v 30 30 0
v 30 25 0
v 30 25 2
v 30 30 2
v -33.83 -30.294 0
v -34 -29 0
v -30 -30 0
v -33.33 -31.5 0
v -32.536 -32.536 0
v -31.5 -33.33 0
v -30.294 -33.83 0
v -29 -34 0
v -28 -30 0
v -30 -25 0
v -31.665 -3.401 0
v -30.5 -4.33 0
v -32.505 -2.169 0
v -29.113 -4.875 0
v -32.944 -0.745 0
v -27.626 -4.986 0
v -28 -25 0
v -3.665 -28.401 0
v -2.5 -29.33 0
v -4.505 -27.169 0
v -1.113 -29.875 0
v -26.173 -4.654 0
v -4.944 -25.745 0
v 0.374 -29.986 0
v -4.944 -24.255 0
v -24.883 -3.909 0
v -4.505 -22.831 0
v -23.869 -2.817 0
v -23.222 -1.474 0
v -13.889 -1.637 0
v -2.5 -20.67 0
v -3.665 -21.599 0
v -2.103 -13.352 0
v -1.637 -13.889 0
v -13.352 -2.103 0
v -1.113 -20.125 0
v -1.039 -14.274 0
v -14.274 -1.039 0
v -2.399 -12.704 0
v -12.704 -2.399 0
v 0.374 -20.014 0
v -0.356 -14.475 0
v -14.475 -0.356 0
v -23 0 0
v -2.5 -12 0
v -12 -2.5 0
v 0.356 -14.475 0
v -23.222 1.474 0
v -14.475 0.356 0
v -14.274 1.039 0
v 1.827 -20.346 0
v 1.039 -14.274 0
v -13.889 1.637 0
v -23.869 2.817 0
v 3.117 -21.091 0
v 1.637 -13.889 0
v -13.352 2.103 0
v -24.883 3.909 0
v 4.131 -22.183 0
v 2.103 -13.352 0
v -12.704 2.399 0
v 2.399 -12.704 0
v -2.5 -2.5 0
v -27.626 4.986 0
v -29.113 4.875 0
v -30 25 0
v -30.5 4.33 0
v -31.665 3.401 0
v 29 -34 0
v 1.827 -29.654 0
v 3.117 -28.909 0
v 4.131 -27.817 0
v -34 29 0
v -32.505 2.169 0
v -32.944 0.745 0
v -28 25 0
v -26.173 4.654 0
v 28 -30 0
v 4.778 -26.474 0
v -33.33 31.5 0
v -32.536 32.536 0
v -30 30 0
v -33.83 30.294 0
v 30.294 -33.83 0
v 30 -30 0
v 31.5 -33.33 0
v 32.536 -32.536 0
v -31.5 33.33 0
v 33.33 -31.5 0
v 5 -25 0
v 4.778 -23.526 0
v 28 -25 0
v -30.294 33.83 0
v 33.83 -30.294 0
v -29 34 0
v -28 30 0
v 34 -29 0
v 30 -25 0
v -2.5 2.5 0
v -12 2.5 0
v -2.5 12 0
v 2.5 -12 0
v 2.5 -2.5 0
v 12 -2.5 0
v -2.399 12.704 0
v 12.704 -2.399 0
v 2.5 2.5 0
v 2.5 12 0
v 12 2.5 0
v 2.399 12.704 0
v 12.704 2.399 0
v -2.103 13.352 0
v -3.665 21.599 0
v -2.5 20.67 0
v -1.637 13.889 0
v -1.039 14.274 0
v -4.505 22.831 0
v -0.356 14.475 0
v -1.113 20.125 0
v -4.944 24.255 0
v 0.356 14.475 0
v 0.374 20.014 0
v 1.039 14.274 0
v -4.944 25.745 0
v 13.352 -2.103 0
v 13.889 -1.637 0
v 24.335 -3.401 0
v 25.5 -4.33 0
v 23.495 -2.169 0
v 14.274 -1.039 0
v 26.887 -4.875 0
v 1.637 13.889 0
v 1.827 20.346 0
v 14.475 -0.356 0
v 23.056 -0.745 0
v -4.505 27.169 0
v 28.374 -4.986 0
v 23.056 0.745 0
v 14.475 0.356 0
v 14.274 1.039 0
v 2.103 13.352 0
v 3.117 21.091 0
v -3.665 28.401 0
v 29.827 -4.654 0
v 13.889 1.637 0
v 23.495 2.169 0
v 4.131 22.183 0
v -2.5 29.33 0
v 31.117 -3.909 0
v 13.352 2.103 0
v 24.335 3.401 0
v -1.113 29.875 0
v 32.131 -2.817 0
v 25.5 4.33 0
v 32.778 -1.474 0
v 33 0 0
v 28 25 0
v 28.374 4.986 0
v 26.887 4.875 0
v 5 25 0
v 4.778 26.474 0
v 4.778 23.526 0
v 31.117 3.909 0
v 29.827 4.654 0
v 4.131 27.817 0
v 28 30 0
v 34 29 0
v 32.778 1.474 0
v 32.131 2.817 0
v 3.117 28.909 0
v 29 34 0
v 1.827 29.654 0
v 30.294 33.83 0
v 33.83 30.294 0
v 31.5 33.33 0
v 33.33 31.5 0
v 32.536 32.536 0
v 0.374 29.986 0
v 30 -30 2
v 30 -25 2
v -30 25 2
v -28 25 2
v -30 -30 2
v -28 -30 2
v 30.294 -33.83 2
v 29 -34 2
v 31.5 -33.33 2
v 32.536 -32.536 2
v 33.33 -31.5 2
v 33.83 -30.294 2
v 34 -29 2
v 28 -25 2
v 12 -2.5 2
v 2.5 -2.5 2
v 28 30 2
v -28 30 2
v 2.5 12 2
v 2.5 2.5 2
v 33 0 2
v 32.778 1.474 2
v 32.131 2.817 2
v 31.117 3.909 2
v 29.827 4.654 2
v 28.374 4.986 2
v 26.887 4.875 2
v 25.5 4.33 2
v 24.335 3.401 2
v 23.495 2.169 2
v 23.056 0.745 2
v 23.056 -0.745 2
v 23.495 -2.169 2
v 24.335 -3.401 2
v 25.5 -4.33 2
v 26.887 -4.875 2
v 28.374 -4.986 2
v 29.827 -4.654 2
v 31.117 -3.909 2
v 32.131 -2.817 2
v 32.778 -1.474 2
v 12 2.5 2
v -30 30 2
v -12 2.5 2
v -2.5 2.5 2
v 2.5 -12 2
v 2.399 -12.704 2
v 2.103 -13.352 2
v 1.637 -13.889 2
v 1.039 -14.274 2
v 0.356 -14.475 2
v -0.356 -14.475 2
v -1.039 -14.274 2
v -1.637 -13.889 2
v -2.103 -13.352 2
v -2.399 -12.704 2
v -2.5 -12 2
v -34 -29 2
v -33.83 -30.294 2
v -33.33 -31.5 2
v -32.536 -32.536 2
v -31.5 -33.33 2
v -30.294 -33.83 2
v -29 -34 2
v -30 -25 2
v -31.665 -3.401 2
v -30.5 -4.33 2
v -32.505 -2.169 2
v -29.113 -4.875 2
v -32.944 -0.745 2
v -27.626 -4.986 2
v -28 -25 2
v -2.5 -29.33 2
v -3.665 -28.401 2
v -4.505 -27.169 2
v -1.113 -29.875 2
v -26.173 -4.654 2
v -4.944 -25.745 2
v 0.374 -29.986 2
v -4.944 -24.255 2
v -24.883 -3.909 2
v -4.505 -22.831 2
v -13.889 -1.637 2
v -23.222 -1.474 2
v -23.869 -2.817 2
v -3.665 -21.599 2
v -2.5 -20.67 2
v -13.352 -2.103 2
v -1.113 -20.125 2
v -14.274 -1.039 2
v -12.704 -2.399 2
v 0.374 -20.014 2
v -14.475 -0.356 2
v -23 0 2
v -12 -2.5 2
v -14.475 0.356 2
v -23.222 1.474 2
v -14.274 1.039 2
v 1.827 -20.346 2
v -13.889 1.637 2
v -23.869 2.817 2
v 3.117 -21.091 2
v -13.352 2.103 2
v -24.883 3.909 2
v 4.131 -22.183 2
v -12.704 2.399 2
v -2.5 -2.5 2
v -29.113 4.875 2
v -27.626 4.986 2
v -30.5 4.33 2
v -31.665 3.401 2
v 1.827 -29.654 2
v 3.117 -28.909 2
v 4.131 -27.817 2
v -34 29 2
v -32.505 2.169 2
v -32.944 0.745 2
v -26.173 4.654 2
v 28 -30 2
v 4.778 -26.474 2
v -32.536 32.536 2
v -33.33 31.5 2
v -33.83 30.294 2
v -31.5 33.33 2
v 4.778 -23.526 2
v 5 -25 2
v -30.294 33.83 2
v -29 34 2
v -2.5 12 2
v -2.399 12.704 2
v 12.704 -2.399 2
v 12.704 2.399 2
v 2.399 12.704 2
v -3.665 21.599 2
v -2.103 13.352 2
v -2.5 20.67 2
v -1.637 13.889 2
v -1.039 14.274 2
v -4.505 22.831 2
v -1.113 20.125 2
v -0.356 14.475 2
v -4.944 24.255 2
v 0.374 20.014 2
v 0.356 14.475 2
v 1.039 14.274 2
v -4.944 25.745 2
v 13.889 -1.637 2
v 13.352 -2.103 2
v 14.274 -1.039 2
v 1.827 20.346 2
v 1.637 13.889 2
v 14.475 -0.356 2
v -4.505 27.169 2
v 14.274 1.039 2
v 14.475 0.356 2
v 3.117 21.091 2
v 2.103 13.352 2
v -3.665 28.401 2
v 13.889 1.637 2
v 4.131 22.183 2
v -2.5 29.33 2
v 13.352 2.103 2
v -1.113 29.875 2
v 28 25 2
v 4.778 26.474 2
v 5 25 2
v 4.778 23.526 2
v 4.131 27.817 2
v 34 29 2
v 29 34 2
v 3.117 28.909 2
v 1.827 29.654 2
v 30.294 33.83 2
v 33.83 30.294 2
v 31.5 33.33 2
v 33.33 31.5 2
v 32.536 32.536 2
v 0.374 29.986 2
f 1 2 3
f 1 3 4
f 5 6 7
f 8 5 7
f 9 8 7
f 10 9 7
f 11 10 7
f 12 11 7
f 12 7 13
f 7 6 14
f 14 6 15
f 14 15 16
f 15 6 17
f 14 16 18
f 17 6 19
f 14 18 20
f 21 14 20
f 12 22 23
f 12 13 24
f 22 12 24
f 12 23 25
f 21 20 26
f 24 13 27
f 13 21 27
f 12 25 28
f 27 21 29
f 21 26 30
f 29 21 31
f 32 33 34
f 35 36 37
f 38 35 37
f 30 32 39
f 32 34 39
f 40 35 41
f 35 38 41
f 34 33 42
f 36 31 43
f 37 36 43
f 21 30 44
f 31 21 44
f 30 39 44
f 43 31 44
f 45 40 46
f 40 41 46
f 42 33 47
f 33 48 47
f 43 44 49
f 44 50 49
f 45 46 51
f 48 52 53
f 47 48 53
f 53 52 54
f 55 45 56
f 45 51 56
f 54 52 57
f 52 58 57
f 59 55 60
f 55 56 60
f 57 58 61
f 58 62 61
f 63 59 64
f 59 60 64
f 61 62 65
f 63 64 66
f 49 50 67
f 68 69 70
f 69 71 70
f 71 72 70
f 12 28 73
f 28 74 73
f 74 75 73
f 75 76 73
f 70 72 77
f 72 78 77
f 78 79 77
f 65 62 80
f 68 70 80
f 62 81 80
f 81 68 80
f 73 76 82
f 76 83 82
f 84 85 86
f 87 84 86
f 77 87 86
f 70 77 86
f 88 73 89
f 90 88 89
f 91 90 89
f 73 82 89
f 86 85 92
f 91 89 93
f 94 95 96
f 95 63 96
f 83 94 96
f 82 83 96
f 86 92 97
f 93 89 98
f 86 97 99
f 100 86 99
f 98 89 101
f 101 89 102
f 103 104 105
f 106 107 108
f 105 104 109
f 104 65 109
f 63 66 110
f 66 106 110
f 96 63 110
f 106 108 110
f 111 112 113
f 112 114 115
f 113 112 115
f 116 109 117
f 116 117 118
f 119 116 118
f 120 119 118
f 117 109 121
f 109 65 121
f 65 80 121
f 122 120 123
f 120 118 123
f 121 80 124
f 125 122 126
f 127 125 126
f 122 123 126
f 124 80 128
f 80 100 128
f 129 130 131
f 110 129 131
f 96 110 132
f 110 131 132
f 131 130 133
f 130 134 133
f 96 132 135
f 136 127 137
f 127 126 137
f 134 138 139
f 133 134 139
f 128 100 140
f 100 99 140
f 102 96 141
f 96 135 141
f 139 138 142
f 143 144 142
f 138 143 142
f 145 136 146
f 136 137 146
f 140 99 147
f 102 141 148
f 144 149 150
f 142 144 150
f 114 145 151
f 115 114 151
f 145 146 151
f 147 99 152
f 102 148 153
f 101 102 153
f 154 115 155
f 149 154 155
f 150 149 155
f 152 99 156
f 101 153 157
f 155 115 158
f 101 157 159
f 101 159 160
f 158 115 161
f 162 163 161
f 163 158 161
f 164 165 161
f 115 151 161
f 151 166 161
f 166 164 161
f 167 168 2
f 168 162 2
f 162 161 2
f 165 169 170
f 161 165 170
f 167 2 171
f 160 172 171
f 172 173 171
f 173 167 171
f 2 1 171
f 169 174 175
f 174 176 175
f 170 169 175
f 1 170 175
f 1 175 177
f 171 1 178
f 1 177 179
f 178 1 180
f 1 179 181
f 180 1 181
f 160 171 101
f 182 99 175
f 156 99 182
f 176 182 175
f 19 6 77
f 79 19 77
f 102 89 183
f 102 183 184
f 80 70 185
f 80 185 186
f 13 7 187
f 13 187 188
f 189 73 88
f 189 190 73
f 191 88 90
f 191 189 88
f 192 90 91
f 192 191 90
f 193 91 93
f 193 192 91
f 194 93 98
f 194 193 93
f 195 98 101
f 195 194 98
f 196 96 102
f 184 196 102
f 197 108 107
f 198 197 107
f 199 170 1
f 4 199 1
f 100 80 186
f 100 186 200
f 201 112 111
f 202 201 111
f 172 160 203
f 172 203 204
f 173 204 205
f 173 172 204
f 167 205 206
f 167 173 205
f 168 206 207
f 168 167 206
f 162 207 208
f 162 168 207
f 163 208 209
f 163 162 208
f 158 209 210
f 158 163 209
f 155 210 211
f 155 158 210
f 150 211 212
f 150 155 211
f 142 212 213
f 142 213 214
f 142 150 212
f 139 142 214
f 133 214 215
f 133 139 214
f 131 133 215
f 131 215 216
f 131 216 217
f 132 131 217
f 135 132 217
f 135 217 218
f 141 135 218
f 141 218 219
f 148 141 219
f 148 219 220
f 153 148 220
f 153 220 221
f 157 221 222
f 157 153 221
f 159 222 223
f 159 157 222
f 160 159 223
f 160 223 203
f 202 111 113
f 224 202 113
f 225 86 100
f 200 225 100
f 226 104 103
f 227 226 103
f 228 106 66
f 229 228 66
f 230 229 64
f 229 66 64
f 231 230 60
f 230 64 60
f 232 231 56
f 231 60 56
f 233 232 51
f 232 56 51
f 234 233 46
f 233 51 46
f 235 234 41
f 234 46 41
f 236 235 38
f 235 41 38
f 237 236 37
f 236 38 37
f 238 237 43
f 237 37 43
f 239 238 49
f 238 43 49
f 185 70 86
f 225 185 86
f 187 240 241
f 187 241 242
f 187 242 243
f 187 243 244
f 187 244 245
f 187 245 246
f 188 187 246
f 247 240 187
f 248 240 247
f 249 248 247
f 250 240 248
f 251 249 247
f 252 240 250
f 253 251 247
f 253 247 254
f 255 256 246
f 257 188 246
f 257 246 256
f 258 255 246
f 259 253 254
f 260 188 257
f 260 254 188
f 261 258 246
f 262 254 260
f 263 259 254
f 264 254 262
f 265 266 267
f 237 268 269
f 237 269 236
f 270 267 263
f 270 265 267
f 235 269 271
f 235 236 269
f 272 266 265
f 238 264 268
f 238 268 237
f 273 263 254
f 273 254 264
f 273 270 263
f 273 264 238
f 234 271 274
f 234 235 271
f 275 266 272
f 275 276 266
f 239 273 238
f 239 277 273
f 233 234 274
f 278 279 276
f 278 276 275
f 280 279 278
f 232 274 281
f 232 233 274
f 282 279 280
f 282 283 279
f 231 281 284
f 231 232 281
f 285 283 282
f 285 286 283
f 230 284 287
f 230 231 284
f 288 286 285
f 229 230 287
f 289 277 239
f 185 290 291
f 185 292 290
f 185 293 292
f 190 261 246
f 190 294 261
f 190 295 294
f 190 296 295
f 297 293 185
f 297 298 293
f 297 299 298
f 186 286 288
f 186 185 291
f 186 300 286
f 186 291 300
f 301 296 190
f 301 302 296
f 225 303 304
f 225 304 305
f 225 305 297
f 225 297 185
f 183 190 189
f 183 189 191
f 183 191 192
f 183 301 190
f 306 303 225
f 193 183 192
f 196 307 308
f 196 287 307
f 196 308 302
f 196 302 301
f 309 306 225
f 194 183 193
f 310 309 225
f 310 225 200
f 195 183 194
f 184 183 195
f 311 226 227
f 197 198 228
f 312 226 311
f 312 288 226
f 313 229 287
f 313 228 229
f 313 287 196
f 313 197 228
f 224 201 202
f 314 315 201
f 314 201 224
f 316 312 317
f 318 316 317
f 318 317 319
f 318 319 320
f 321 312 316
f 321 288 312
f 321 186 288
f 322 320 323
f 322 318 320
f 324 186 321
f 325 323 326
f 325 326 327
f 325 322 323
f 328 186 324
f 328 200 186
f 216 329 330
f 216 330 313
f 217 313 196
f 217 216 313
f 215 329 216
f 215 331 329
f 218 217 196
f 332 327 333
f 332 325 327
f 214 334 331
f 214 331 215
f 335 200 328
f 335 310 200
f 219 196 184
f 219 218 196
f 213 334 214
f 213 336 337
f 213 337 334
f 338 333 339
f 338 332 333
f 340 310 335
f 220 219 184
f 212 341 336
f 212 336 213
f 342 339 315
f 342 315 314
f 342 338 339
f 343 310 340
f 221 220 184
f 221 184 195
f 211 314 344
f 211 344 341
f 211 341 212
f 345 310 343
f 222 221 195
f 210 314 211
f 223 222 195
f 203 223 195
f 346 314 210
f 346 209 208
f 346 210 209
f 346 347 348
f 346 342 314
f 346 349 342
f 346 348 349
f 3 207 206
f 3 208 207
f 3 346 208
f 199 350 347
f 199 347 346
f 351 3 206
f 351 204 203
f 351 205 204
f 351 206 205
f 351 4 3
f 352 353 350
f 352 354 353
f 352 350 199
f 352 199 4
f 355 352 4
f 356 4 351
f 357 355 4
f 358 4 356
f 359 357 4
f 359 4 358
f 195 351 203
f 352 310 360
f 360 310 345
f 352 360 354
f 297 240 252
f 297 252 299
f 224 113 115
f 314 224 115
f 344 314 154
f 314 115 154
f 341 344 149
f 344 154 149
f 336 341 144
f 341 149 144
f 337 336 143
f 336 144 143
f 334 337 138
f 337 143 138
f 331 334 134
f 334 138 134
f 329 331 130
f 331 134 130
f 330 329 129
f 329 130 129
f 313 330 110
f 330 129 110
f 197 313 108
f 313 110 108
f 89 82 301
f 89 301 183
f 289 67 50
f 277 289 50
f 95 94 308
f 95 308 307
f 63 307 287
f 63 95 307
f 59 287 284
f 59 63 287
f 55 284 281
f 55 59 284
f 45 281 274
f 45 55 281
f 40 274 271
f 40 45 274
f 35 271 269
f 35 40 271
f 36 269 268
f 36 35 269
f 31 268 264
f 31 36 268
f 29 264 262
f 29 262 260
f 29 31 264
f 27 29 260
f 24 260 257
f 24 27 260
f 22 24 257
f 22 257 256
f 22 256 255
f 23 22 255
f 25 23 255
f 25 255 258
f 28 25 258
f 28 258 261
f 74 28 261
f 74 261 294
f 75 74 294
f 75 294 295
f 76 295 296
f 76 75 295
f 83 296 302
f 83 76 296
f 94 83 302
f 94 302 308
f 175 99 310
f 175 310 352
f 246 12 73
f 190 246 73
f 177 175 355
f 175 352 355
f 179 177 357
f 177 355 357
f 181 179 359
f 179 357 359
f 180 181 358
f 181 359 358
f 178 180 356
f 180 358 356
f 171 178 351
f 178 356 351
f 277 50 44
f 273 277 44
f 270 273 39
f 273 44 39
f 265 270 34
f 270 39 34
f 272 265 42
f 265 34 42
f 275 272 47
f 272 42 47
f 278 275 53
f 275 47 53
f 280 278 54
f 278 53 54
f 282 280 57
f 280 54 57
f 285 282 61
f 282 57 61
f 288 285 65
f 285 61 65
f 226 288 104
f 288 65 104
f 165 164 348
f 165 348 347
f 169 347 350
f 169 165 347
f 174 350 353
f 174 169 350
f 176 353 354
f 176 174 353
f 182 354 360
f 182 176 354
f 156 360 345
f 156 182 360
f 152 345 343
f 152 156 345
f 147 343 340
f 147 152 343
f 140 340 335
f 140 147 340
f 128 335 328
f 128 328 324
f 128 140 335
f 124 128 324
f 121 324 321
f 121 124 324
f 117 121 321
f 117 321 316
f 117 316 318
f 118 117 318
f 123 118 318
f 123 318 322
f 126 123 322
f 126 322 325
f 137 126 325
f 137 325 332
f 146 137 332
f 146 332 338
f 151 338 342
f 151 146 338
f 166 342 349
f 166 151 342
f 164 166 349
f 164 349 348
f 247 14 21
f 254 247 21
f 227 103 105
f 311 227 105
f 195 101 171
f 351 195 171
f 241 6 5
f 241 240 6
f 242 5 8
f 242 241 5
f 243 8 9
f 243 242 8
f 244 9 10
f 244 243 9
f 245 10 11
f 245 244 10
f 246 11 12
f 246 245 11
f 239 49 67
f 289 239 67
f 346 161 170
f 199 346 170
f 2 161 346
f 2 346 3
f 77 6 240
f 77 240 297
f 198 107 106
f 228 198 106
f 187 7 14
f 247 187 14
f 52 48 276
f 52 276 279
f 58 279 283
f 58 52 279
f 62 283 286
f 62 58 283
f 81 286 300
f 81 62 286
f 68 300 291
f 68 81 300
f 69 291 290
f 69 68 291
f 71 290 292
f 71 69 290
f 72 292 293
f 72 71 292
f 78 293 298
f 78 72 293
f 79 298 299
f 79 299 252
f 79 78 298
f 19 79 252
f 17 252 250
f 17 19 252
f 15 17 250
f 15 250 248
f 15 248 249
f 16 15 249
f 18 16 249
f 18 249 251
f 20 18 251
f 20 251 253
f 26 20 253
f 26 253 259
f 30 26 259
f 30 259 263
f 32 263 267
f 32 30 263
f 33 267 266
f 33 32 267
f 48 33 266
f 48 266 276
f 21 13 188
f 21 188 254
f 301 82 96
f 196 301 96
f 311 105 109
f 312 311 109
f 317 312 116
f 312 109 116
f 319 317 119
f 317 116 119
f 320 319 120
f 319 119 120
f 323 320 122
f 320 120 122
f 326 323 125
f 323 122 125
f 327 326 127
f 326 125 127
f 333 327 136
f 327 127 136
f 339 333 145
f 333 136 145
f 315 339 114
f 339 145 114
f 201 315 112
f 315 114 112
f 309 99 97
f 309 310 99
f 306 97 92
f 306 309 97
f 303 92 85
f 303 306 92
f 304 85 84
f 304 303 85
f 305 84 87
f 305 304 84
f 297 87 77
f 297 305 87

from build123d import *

# Parameters (mm, degrees)
SKETCH1_W           = 68
SKETCH1_H           = 68
SKETCH1_W_2         = 2
SKETCH1_H_2         = 5
SKETCH1_R           = 5
BOSS_EXTRUDE1_DEPTH = 2
FILLET2_R           = 5
FILLET3_R           = 5
FILLET4_R           = 5
FILLET5_R           = 5


with BuildPart() as part:
    # Sketch1 → Boss-Extrude1 (new body)
    with BuildSketch(Plane.XY):
        Rectangle(SKETCH1_W, SKETCH1_H)
        with Locations((-29, -27.5)):
            Rectangle(SKETCH1_W_2, SKETCH1_H_2, mode=Mode.SUBTRACT)
        with Locations((0, -25)):
            Circle(SKETCH1_R, mode=Mode.SUBTRACT)
        with Locations((29, -27.5)):
            Rectangle(SKETCH1_W_2, SKETCH1_H_2, mode=Mode.SUBTRACT)
        with Locations((-28, 0)):
            Circle(SKETCH1_R, mode=Mode.SUBTRACT)
        with Locations((-29, 27.5)):
            Rectangle(SKETCH1_W_2, SKETCH1_H_2, mode=Mode.SUBTRACT)
        with BuildLine():
            ThreePointArc((-12, -2.5), (-14.5, 0), (-12, 2.5))
            Line((-12, 2.5), (-2.5, 2.5))
            Line((-2.5, 2.5), (-2.5, 12))
            ThreePointArc((-2.5, 12), (0, 14.5), (2.5, 12))
            Line((2.5, 12), (2.5, 2.5))
            Line((2.5, 2.5), (12, 2.5))
            ThreePointArc((12, 2.5), (14.5, 0), (12, -2.5))
            Line((12, -2.5), (2.5, -2.5))
            Line((2.5, -2.5), (2.5, -12))
            ThreePointArc((2.5, -12), (0, -14.5), (-2.5, -12))
            Line((-2.5, -12), (-2.5, -2.5))
            Line((-2.5, -2.5), (-12, -2.5))
        make_face(mode=Mode.SUBTRACT)
        with Locations((28, 0)):
            Circle(SKETCH1_R, mode=Mode.SUBTRACT)
        with Locations((0, 25)):
            Circle(SKETCH1_R, mode=Mode.SUBTRACT)
        with Locations((29, 27.5)):
            Rectangle(SKETCH1_W_2, SKETCH1_H_2, mode=Mode.SUBTRACT)
    extrude(amount=BOSS_EXTRUDE1_DEPTH)

    # Fillet2
    fillet2_edges = [part.edges().sort_by_distance(p)[0] for p in [
        (34, 34, 1),
    ]]
    fillet(fillet2_edges, radius=FILLET2_R)

    # Fillet3
    fillet3_edges = [part.edges().sort_by_distance(p)[0] for p in [
        (-34, 34, 1),
    ]]
    fillet(fillet3_edges, radius=FILLET3_R)

    # Fillet4
    fillet4_edges = [part.edges().sort_by_distance(p)[0] for p in [
        (-34, -34, 1),
    ]]
    fillet(fillet4_edges, radius=FILLET4_R)

    # Fillet5
    fillet5_edges = [part.edges().sort_by_distance(p)[0] for p in [
        (34, -34, 1),
    ]]
    fillet(fillet5_edges, radius=FILLET5_R)


solid = part.part
